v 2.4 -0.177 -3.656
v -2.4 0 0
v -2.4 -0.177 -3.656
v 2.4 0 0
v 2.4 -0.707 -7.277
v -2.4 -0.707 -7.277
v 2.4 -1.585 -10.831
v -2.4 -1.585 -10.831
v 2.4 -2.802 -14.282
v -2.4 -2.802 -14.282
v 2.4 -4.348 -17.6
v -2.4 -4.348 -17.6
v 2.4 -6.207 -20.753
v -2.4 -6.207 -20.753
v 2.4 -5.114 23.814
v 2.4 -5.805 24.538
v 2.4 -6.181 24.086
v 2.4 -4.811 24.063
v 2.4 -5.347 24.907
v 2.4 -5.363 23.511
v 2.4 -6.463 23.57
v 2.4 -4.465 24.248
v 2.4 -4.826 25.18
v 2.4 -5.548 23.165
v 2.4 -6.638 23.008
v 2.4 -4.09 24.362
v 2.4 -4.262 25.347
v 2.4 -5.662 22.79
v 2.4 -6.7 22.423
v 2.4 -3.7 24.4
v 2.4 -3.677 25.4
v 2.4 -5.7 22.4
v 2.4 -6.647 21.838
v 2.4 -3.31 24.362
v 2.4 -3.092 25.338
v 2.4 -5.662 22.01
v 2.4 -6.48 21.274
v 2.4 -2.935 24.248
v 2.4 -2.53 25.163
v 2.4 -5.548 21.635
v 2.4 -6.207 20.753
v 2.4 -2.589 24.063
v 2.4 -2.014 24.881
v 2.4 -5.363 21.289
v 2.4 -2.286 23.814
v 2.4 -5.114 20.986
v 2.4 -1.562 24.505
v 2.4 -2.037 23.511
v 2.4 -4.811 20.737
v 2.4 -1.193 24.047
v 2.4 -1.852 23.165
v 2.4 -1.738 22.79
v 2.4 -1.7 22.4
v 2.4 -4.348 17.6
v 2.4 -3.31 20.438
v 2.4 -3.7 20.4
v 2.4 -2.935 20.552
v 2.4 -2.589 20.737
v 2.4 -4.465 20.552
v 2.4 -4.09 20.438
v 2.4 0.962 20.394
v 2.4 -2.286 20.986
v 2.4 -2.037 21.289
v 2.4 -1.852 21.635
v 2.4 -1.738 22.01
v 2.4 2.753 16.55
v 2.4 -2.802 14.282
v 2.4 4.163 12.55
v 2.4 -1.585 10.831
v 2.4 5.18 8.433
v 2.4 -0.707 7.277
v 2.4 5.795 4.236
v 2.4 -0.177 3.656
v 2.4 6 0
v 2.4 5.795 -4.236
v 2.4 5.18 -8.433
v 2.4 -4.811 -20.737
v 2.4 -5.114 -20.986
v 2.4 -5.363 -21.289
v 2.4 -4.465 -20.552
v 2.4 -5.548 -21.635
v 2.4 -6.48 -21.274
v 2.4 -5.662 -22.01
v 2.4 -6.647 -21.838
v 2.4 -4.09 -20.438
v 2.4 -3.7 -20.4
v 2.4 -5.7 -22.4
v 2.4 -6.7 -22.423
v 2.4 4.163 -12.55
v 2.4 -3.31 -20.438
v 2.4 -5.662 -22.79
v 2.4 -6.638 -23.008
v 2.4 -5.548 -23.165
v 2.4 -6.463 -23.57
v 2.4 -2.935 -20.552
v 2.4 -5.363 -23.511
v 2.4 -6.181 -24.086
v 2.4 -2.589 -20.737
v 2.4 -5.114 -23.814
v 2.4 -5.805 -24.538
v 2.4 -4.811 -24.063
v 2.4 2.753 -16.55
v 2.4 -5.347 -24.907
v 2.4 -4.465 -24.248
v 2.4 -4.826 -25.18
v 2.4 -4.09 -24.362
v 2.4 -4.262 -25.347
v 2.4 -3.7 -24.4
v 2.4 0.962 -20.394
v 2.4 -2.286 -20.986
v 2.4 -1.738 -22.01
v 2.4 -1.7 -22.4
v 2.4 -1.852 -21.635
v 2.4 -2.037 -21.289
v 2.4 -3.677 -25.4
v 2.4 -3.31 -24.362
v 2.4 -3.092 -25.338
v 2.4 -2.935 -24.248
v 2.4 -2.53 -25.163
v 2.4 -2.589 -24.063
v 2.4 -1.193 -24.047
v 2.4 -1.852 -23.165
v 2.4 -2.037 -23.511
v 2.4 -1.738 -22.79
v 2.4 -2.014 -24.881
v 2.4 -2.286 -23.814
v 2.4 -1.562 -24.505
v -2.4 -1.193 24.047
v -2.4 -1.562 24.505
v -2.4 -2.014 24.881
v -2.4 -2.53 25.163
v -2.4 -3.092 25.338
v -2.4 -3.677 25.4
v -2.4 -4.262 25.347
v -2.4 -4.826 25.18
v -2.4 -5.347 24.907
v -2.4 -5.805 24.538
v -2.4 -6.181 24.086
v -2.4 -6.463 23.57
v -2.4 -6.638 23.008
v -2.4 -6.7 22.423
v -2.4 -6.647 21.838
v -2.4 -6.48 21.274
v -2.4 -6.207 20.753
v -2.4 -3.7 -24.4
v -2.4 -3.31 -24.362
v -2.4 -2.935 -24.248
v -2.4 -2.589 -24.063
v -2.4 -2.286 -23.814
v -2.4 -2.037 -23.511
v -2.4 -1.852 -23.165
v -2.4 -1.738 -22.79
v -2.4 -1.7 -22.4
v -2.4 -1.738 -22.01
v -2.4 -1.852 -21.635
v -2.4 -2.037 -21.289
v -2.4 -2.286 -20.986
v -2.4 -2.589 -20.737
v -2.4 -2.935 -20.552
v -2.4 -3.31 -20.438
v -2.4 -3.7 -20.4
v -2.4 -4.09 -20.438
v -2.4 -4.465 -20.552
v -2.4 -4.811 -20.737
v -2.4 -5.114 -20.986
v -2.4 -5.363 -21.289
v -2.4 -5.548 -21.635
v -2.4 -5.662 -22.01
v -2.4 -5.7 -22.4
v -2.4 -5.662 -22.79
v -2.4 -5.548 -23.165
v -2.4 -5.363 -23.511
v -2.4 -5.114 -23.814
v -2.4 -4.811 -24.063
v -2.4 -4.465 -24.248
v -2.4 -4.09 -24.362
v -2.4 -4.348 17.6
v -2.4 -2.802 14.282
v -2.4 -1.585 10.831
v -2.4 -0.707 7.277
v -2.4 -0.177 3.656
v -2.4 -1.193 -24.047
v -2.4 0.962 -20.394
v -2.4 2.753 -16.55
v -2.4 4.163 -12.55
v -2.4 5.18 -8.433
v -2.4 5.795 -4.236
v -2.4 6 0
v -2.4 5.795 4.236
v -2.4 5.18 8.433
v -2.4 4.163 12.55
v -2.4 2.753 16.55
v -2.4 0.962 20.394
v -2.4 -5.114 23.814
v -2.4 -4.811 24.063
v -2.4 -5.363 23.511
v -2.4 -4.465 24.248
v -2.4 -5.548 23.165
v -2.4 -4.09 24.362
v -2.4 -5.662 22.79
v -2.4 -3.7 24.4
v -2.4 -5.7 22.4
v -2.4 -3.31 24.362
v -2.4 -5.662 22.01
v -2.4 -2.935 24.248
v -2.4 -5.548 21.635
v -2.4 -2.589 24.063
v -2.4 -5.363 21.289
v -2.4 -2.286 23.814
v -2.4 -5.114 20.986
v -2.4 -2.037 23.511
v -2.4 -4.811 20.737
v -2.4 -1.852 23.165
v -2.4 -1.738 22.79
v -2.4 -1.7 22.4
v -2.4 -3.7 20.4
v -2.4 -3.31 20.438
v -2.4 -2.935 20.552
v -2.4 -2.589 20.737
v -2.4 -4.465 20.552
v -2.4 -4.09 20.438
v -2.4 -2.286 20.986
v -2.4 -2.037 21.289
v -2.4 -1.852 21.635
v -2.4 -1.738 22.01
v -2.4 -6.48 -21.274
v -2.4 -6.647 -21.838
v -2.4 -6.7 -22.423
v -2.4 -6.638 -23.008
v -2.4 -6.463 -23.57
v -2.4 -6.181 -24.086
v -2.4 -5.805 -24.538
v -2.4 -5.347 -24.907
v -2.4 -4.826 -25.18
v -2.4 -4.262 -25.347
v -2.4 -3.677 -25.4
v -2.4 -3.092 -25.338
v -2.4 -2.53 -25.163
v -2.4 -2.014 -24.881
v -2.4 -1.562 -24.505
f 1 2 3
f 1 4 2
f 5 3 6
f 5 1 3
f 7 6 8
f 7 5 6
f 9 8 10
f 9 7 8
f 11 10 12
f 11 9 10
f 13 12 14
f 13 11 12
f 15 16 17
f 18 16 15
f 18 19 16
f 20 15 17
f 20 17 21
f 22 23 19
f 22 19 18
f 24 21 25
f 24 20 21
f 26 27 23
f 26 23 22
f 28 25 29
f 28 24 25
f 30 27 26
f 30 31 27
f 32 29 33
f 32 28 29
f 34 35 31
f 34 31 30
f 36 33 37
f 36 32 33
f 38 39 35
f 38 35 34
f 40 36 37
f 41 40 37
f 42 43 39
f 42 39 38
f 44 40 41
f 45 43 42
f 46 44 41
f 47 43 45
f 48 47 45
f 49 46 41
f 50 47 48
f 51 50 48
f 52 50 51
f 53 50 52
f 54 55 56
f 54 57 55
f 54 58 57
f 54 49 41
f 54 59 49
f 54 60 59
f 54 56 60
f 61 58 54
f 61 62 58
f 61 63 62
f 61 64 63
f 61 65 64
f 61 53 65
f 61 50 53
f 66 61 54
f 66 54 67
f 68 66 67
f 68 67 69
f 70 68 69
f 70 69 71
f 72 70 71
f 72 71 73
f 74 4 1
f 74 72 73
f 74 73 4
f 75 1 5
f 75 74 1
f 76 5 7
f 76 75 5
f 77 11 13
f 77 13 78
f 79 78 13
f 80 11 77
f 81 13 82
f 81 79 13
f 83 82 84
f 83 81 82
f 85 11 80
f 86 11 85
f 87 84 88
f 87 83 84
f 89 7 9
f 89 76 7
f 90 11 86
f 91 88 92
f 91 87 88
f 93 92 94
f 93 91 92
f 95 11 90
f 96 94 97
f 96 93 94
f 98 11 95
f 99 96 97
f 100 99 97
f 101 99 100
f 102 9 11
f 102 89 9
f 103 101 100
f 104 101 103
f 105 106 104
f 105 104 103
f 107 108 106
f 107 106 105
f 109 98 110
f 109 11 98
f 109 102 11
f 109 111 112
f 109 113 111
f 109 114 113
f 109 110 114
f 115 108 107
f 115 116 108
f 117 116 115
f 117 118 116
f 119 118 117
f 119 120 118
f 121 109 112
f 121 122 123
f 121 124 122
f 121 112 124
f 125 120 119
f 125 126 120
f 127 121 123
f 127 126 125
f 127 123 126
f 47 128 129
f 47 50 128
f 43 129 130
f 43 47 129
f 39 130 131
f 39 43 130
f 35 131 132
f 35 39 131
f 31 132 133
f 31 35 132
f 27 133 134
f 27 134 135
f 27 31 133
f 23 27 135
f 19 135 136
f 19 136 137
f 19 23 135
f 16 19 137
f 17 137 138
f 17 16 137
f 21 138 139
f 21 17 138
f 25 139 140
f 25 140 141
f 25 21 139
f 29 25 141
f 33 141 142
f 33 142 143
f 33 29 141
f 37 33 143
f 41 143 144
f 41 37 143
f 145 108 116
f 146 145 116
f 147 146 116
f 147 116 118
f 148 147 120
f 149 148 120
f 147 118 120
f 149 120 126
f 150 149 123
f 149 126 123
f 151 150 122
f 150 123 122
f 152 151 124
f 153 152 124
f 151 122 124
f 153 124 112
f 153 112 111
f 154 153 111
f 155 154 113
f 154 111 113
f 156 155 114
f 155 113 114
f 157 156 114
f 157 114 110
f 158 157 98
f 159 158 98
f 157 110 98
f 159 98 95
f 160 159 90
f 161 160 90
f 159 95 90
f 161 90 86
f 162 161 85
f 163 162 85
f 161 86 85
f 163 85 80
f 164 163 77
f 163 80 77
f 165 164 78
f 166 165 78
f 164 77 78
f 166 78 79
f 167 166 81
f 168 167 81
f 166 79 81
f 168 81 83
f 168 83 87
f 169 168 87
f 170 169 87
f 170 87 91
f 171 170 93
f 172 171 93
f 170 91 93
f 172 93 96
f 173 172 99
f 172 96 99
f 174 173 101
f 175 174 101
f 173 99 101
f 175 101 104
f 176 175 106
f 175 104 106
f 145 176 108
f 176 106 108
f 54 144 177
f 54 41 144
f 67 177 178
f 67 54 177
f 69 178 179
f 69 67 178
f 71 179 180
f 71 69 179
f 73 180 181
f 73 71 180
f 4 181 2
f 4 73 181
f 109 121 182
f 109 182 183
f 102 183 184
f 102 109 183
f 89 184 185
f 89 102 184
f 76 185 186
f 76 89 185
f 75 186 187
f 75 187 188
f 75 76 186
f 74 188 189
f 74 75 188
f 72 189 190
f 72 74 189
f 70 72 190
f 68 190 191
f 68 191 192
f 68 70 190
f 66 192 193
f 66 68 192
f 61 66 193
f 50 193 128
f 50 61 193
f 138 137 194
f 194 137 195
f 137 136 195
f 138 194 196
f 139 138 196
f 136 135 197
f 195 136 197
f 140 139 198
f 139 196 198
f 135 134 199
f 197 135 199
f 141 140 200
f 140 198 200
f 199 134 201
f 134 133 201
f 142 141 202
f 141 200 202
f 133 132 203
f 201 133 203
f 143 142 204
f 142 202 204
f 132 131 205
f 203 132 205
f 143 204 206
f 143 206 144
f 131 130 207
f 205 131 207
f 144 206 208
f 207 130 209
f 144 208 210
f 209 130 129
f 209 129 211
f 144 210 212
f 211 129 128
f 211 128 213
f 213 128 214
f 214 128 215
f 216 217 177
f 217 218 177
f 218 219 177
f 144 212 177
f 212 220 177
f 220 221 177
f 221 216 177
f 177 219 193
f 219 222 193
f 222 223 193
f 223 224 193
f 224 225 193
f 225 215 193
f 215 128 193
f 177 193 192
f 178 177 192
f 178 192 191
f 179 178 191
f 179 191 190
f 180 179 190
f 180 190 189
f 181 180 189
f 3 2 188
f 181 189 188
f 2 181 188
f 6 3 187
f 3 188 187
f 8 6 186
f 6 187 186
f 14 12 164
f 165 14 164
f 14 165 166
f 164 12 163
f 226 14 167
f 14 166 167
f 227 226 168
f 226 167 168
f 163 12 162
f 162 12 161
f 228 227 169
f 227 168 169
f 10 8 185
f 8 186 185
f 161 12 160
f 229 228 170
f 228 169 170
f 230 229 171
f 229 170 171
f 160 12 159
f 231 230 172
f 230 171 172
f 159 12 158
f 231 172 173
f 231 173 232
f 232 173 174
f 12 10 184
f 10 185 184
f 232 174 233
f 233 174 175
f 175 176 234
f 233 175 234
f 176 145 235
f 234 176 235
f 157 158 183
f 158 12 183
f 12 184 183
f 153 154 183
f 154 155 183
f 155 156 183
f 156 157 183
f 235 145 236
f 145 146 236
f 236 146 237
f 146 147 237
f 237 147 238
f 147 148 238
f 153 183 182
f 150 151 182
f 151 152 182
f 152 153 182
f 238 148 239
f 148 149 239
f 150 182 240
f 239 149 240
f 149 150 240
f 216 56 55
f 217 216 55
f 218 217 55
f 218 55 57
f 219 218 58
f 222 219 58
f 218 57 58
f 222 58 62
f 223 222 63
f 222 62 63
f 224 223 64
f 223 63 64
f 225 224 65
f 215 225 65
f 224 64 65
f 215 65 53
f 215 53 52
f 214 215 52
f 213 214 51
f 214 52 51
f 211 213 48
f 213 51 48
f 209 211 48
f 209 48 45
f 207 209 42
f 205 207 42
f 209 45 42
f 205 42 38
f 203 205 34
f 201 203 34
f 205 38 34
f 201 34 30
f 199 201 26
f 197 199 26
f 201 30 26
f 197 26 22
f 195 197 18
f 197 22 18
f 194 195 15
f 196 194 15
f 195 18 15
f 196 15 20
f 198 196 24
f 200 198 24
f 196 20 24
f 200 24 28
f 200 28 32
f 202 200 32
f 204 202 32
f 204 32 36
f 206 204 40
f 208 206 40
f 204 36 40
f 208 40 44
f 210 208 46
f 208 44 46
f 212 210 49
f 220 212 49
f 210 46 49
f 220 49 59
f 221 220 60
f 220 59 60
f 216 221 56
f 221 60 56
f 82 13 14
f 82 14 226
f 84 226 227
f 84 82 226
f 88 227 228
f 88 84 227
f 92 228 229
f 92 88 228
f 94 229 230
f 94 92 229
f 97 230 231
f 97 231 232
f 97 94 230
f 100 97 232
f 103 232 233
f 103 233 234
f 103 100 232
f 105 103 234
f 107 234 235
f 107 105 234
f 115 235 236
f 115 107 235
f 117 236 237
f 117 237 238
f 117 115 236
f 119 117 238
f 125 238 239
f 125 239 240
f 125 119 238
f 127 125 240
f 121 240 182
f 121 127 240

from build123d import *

# Parameters (mm, degrees)
BOSS_EXTRUDE1_DEPTH = 2.399999953
SKETCH2_R           = 2
CUT_EXTRUDE1_DEPTH  = 4.8


with BuildPart() as part:
    # Sketch1 → Boss-Extrude1 (new body, symmetric)
    with BuildSketch(Plane(origin=(0, 0, 0), x_dir=(0, 0, -1), z_dir=(1, 0, 0))):
        with BuildLine():
            ThreePointArc((0, 0), (10.830584713, -1.585060066), (20.752730266, -6.207289856))
            ThreePointArc((20.752730266, -6.207289856), (24.907289856, -5.347269734), (24.047269734, -1.192710144))
            ThreePointArc((24.047269734, -1.192710144), (12.549962758, 4.163308324), (0, 6))
            ThreePointArc((0, 6), (-12.549962758, 4.163308324), (-24.047269734, -1.192710144))
            ThreePointArc((-24.047269734, -1.192710144), (-24.907289856, -5.347269734), (-20.752730266, -6.207289856))
            ThreePointArc((-20.752730266, -6.207289856), (-10.830584713, -1.585060066), (0, 0))
        make_face()
    extrude(amount=BOSS_EXTRUDE1_DEPTH, both=True)

    # Sketch2 → Cut-Extrude1 (cut)
    with BuildSketch(Plane(origin=(2.399999953, 0, 0), x_dir=(0, 0, -1), z_dir=(1, 0, 0))):
        with Locations((-22.4, -3.7)):
            Circle(SKETCH2_R)
        with Locations((22.4, -3.7)):
            Circle(SKETCH2_R)
    extrude(amount=-CUT_EXTRUDE1_DEPTH, mode=Mode.SUBTRACT)


solid = part.part
